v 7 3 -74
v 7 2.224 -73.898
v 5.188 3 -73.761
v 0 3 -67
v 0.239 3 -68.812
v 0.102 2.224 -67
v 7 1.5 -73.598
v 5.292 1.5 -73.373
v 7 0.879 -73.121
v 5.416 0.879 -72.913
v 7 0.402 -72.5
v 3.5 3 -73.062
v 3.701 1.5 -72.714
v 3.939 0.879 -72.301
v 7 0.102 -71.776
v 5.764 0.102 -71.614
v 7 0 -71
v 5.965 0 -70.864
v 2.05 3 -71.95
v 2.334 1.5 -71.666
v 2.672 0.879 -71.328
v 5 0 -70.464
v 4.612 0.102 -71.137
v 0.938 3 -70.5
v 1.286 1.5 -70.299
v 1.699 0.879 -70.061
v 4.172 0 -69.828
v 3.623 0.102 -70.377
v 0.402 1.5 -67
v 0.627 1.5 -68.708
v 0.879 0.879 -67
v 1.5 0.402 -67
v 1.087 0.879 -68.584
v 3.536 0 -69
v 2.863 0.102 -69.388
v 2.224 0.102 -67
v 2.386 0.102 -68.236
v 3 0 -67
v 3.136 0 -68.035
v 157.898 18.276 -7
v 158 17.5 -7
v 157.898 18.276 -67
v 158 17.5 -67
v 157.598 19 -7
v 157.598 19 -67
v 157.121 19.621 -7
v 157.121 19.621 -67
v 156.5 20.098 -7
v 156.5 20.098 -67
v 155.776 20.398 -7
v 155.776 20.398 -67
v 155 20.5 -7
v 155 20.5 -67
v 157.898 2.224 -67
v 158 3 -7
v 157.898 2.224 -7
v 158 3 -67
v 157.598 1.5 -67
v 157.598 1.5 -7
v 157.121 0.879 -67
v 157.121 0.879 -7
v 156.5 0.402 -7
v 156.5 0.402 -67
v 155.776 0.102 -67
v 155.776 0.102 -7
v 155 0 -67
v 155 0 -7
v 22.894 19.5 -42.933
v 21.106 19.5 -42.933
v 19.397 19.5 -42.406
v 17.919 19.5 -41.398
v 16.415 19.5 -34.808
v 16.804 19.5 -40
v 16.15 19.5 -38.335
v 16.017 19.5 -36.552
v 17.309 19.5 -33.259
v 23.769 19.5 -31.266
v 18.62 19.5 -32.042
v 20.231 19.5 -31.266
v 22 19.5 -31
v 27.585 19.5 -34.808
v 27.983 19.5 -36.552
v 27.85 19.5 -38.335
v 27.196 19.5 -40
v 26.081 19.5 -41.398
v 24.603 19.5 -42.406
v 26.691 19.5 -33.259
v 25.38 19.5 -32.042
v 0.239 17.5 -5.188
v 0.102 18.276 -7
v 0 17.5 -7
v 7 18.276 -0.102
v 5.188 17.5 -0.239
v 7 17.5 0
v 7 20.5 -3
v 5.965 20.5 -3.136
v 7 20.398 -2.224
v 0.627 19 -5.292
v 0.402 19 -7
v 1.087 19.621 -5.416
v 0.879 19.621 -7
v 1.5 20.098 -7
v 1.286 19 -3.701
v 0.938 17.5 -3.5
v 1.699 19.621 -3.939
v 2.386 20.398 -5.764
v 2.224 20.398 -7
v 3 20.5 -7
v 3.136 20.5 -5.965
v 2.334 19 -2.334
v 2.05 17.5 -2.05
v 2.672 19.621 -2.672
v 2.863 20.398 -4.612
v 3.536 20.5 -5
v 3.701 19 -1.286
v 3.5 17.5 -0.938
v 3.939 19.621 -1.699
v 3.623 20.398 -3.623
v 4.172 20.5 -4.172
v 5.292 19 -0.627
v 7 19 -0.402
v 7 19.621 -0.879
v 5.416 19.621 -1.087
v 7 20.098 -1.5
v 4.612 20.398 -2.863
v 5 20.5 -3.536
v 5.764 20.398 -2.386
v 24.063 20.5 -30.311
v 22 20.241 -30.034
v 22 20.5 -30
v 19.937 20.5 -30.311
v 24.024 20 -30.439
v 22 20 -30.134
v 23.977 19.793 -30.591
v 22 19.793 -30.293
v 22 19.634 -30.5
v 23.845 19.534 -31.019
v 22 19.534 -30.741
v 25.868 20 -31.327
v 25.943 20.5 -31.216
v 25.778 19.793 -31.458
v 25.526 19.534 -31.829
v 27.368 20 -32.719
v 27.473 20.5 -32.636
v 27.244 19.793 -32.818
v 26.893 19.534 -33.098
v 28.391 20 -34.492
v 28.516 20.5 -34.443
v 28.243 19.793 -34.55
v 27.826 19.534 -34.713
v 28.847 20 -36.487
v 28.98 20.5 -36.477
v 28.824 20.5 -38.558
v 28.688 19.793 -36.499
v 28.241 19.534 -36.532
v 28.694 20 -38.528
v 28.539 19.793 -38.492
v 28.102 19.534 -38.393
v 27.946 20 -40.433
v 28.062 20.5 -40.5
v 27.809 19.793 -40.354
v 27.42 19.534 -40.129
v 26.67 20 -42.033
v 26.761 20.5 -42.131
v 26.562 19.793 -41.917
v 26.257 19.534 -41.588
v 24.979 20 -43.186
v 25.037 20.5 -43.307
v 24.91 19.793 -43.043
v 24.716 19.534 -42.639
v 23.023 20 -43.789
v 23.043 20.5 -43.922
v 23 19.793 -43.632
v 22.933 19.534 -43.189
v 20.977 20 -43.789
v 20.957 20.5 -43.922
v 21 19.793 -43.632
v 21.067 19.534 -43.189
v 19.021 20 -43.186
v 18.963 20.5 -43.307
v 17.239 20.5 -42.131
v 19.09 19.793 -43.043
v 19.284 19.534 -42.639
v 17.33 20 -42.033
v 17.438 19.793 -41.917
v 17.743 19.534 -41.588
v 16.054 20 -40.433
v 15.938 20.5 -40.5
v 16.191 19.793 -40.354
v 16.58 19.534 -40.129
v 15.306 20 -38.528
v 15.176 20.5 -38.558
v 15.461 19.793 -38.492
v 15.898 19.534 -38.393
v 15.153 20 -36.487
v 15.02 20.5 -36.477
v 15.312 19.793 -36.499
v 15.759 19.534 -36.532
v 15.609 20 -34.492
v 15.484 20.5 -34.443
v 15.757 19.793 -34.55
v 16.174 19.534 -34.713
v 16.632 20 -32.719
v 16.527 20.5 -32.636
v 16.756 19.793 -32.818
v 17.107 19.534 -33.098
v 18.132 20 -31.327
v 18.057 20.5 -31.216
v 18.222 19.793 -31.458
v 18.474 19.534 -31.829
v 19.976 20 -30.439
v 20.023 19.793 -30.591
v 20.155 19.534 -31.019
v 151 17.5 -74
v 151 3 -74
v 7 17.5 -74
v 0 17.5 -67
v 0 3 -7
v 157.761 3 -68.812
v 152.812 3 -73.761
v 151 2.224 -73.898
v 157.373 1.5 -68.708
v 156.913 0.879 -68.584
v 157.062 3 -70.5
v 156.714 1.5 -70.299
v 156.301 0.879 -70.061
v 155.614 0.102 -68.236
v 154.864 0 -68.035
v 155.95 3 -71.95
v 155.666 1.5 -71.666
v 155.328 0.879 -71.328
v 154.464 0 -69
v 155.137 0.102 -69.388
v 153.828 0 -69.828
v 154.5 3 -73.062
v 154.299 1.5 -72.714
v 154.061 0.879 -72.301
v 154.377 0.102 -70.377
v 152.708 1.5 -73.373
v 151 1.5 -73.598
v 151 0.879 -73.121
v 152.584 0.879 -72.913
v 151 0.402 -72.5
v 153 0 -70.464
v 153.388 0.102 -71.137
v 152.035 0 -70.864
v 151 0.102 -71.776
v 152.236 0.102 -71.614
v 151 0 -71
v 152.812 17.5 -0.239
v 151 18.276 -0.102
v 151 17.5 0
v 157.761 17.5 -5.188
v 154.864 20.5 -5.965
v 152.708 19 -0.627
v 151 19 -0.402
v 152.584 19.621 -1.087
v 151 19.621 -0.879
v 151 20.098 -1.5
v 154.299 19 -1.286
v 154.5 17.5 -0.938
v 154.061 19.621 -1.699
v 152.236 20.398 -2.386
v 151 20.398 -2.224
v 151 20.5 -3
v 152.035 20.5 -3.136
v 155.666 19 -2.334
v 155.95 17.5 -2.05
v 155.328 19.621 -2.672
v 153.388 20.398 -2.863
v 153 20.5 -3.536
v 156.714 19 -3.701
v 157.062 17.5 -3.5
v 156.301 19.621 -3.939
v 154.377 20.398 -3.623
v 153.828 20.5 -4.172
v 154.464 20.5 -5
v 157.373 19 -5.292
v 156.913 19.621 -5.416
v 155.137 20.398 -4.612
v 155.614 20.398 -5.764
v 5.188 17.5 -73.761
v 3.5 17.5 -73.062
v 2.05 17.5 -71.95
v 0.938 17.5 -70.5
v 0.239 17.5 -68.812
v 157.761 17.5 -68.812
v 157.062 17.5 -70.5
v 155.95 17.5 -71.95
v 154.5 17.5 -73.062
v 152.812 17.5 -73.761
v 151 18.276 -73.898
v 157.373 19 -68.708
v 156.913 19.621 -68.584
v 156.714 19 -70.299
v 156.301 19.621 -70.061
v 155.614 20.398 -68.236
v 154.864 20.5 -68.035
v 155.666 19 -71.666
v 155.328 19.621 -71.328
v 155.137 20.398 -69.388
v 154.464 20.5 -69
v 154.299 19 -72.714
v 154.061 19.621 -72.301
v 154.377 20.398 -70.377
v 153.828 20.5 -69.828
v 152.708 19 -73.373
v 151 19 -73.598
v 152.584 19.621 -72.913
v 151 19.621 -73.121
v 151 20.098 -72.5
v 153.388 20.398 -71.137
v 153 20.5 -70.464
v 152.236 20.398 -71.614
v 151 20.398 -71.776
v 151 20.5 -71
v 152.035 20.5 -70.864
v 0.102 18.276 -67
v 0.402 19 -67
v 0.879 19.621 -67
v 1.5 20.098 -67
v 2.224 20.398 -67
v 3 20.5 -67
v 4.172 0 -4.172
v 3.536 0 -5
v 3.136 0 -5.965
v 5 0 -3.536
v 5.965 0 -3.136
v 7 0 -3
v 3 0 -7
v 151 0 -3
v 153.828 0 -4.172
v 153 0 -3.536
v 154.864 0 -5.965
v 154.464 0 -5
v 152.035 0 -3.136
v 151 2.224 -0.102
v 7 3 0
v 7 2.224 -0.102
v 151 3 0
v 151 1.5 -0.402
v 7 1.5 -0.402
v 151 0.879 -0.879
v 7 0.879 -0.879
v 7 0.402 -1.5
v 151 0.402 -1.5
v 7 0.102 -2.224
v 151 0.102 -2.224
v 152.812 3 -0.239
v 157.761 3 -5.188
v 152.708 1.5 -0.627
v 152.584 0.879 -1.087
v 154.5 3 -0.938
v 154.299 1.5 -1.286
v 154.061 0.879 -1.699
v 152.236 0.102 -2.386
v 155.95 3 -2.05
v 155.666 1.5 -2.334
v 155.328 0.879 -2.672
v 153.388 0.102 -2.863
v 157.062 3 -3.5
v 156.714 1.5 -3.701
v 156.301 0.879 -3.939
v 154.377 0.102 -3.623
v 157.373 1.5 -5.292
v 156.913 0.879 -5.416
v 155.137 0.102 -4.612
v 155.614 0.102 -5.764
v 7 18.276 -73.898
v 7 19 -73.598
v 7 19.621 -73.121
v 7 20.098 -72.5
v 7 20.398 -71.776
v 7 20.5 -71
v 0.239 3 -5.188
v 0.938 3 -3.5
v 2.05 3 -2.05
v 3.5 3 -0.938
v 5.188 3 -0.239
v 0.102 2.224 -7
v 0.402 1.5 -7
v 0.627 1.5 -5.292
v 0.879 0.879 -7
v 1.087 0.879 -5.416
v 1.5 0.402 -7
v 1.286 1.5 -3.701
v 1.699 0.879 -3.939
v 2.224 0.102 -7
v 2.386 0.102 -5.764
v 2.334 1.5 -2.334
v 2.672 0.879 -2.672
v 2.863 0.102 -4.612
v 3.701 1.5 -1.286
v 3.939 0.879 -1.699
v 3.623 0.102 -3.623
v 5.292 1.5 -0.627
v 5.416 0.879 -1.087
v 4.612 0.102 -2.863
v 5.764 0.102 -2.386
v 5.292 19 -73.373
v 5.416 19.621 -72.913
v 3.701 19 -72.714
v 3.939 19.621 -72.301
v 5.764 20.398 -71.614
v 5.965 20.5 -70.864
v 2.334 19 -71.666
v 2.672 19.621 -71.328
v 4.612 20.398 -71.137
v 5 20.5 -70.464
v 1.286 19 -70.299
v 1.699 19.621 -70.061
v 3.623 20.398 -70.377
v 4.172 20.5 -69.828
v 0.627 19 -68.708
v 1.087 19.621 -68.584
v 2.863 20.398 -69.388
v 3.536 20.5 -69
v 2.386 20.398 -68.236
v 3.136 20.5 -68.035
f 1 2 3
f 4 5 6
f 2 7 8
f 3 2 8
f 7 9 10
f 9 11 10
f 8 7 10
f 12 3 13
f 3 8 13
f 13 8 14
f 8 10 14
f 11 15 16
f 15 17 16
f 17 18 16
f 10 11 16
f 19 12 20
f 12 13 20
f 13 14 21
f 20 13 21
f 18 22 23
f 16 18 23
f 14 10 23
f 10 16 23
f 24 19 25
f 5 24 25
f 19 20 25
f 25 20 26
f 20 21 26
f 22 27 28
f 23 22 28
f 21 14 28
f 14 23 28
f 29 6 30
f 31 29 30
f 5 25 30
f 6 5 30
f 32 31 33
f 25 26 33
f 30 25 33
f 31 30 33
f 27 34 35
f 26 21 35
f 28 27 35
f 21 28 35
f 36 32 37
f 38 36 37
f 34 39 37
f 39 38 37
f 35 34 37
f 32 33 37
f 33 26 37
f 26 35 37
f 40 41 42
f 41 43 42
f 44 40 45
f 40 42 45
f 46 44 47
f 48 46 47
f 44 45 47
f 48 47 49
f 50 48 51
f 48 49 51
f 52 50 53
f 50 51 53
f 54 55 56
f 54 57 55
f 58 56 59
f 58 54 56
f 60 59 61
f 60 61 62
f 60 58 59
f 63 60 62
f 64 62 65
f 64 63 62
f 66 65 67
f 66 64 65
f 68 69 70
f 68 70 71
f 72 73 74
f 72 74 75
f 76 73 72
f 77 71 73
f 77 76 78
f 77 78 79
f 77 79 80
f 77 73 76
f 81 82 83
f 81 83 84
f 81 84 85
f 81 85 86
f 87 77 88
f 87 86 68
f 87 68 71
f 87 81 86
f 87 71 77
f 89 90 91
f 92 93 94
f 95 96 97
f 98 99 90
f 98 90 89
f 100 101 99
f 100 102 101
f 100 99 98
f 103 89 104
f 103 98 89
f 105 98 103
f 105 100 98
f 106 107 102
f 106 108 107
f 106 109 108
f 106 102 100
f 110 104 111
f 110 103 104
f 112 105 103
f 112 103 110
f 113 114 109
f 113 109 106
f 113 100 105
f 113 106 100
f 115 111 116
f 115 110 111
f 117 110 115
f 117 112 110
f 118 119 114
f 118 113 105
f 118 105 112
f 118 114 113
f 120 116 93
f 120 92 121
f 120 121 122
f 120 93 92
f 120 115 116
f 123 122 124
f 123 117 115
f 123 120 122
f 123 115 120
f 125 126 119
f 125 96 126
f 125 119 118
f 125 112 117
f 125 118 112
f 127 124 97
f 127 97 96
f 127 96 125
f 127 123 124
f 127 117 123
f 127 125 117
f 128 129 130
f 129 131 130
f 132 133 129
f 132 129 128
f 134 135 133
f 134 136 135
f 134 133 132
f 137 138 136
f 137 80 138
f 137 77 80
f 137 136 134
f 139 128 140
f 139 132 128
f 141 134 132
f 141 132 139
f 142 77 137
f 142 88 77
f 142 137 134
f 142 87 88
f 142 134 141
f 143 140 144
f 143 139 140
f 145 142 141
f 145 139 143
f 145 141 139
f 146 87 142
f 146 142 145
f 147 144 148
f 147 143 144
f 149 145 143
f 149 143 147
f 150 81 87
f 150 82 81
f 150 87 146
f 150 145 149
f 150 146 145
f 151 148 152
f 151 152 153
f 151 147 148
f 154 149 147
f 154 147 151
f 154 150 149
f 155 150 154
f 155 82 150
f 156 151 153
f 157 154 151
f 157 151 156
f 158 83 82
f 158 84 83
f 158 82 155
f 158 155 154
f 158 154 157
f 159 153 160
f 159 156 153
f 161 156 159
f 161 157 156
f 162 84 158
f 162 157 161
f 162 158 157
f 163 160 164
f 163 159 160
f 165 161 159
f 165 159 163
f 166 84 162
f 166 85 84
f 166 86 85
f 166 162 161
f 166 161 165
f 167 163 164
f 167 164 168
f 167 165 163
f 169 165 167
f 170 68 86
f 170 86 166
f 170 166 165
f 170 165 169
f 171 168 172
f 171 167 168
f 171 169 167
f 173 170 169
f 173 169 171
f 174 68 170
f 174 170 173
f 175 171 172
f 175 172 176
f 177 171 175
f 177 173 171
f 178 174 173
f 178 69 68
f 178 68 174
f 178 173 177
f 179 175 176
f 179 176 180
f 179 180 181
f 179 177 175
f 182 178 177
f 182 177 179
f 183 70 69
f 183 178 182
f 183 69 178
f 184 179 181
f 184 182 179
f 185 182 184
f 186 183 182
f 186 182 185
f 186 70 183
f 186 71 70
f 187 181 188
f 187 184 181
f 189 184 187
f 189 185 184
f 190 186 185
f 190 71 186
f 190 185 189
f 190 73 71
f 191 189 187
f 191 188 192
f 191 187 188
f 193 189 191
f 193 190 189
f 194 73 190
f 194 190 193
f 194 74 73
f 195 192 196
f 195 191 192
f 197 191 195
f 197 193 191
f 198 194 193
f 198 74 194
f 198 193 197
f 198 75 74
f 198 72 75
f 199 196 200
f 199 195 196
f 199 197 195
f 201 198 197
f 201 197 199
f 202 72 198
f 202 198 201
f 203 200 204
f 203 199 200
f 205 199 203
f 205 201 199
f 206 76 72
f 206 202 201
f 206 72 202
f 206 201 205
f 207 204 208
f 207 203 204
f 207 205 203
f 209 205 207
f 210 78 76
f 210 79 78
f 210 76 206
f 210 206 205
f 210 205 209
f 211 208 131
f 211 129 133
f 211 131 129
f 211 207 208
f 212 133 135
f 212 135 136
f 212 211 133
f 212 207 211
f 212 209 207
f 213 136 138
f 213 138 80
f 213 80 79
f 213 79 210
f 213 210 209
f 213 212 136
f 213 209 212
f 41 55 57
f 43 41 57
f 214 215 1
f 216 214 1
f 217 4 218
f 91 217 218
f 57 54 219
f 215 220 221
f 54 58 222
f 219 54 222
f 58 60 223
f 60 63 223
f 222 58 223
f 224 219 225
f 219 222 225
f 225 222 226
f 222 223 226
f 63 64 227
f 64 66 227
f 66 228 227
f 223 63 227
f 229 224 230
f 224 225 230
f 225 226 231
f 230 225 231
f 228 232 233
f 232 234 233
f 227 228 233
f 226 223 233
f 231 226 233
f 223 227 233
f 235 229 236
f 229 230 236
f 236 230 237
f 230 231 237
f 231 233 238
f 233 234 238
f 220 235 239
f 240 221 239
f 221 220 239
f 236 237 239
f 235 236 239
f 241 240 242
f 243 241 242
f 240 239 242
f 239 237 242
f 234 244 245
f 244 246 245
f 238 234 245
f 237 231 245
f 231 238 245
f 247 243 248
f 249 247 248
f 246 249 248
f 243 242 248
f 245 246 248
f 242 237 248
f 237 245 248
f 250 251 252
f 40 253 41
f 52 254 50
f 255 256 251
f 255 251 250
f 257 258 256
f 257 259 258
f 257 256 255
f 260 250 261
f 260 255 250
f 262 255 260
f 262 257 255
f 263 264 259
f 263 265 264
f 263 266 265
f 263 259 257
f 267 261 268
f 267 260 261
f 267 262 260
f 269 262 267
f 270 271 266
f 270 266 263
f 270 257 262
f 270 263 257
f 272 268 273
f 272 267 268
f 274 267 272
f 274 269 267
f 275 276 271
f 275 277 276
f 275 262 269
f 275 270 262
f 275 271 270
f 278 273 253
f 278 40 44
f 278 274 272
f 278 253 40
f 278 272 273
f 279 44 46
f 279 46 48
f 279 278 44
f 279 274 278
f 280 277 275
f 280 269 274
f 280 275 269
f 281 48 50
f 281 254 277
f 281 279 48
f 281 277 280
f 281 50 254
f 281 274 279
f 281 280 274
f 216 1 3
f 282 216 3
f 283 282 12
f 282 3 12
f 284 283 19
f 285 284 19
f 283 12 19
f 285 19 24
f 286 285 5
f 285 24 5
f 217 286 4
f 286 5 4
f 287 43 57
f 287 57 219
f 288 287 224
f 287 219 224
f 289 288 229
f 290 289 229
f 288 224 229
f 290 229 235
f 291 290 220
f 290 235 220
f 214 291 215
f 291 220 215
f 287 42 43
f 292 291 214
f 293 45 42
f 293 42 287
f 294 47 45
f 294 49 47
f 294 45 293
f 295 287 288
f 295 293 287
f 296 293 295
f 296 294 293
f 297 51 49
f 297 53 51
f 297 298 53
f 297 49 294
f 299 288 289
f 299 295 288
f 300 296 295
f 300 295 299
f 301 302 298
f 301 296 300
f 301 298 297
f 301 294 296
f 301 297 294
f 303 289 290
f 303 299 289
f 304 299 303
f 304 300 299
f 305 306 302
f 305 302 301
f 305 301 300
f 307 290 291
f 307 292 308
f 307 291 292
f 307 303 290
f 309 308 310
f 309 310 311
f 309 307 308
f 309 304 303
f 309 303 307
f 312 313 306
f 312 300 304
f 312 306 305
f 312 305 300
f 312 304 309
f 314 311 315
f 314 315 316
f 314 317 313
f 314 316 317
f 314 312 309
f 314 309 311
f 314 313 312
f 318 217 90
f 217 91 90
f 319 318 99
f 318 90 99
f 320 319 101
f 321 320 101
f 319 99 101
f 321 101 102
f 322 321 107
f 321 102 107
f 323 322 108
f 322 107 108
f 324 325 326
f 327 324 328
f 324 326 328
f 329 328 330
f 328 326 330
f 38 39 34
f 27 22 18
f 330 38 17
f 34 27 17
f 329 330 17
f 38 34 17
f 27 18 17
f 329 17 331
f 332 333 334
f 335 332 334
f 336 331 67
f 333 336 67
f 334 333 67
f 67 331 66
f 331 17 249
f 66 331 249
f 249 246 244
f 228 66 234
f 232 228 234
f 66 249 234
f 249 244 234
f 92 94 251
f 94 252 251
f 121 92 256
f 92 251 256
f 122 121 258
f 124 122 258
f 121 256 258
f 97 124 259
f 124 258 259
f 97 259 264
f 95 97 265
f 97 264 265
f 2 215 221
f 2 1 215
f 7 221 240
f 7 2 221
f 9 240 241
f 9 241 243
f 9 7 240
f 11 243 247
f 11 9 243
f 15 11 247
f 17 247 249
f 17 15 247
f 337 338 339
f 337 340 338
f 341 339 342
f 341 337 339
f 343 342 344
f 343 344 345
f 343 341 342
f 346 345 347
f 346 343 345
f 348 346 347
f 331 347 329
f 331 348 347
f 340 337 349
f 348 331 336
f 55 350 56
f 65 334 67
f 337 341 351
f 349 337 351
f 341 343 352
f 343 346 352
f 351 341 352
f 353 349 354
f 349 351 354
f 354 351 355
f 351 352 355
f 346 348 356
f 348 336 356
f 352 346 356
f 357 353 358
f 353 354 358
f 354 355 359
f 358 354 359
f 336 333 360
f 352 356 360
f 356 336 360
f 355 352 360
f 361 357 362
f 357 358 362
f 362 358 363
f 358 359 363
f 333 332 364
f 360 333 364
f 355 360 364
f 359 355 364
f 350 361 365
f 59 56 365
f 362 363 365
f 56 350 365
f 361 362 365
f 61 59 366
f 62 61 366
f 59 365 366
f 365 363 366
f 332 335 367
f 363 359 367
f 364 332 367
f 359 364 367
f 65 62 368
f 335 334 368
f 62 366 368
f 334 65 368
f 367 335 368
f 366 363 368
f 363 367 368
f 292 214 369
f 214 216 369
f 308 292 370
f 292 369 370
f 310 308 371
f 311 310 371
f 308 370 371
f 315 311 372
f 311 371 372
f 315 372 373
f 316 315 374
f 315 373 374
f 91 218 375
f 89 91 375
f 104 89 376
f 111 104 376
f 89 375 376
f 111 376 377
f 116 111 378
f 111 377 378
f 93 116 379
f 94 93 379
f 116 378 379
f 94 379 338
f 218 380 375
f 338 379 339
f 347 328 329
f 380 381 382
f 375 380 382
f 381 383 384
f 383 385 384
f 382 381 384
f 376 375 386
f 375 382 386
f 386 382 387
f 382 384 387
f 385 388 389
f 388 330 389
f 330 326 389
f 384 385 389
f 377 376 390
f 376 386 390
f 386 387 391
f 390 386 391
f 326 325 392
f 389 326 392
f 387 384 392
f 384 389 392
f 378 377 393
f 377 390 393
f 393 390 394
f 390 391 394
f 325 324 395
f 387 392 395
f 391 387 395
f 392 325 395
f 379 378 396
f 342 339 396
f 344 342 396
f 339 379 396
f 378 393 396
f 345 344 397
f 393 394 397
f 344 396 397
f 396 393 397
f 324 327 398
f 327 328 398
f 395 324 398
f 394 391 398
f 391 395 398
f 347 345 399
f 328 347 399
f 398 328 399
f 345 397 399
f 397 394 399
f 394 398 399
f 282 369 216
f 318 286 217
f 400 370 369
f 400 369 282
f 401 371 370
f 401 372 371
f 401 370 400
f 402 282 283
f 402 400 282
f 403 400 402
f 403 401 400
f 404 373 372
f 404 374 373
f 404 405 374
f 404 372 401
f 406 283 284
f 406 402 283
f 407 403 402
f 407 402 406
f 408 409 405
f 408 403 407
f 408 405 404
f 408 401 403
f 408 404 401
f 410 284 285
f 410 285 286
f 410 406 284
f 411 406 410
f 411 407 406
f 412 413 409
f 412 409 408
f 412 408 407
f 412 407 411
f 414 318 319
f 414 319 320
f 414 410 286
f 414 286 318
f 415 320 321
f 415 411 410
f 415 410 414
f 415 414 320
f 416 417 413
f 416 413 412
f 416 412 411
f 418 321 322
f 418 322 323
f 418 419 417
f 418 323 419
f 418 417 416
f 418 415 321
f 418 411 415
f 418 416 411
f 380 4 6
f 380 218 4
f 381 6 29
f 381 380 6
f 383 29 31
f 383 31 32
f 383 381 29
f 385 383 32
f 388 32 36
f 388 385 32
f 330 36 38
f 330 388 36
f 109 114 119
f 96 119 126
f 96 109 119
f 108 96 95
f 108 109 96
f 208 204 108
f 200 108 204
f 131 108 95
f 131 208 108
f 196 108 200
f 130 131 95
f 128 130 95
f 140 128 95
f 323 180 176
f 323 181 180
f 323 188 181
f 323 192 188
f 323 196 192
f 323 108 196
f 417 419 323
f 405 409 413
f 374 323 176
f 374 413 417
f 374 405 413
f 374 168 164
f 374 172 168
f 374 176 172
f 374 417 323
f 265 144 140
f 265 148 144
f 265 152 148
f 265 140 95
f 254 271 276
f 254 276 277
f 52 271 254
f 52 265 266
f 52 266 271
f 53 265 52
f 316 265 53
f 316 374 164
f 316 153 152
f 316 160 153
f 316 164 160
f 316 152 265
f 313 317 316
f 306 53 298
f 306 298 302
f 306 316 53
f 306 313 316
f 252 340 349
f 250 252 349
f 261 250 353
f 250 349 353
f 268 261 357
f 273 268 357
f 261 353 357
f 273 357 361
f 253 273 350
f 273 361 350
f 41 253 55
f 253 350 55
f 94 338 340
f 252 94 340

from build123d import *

# Parameters (mm, degrees)
BOSS_EXTRUDE1_DEPTH = 20.5
FILLET1_R           = 3
SKETCH2_R           = 7
CUT_EXTRUDE1_DEPTH  = 1
FILLET2_R           = 1


with BuildPart() as part:
    # Sketch1 → Boss-Extrude1 (new body)
    with BuildSketch(Plane(origin=(0, 0, 0), x_dir=(1, 0, 0), z_dir=(0, 1, 0))):
        with BuildLine():
            Line((7, 0), (151, 0))
            ThreePointArc((151, 0), (155.949747468, 2.050252532), (158, 7))
            Line((158, 7), (158, 67))
            ThreePointArc((158, 67), (155.949747468, 71.949747468), (151, 74))
            Line((151, 74), (7, 74))
            ThreePointArc((7, 74), (2.050252532, 71.949747468), (0, 67))
            Line((0, 67), (0, 7))
            ThreePointArc((0, 7), (2.050252532, 2.050252532), (7, 0))
        make_face()
    extrude(amount=BOSS_EXTRUDE1_DEPTH)

    # Fillet1
    fillet1_edges = [part.edges().sort_by_distance(p)[0] for p in [
        (0, 0, -37),
        (2.050252532, 0, -71.949747468),
        (79, 0, -74),
        (155.949747468, 0, -71.949747468),
        (2.050252532, 20.5, -71.949747468),
        (0, 20.5, -37),
        (2.050252532, 20.5, -2.050252532),
        (79, 20.5, 0),
        (155.949747468, 20.5, -2.050252532),
        (158, 20.5, -37),
        (155.949747468, 20.5, -71.949747468),
        (158, 0, -37),
        (79, 20.5, -74),
        (155.949747468, 0, -2.050252532),
        (79, 0, 0),
        (2.050252532, 0, -2.050252532),
    ]]
    fillet(fillet1_edges, radius=FILLET1_R)

    # Sketch2 → Cut-Extrude1 (cut)
    with BuildSketch(Plane(origin=(0, 20.5, 0), x_dir=(1, 0, 0), z_dir=(0, 1, 0))):
        with Locations(Location((22, 37, 0), (0, 0, 270))):
            Circle(SKETCH2_R)
    extrude(amount=-CUT_EXTRUDE1_DEPTH, mode=Mode.SUBTRACT)

    # Fillet2
    fillet2_edges = [part.edges().sort_by_distance(p)[0] for p in [
        (22, 19.5, -44),
    ]]
    fillet(fillet2_edges, radius=FILLET2_R - 0.0001)  # a hair under: the kernel refuses the full size


solid = part.part
